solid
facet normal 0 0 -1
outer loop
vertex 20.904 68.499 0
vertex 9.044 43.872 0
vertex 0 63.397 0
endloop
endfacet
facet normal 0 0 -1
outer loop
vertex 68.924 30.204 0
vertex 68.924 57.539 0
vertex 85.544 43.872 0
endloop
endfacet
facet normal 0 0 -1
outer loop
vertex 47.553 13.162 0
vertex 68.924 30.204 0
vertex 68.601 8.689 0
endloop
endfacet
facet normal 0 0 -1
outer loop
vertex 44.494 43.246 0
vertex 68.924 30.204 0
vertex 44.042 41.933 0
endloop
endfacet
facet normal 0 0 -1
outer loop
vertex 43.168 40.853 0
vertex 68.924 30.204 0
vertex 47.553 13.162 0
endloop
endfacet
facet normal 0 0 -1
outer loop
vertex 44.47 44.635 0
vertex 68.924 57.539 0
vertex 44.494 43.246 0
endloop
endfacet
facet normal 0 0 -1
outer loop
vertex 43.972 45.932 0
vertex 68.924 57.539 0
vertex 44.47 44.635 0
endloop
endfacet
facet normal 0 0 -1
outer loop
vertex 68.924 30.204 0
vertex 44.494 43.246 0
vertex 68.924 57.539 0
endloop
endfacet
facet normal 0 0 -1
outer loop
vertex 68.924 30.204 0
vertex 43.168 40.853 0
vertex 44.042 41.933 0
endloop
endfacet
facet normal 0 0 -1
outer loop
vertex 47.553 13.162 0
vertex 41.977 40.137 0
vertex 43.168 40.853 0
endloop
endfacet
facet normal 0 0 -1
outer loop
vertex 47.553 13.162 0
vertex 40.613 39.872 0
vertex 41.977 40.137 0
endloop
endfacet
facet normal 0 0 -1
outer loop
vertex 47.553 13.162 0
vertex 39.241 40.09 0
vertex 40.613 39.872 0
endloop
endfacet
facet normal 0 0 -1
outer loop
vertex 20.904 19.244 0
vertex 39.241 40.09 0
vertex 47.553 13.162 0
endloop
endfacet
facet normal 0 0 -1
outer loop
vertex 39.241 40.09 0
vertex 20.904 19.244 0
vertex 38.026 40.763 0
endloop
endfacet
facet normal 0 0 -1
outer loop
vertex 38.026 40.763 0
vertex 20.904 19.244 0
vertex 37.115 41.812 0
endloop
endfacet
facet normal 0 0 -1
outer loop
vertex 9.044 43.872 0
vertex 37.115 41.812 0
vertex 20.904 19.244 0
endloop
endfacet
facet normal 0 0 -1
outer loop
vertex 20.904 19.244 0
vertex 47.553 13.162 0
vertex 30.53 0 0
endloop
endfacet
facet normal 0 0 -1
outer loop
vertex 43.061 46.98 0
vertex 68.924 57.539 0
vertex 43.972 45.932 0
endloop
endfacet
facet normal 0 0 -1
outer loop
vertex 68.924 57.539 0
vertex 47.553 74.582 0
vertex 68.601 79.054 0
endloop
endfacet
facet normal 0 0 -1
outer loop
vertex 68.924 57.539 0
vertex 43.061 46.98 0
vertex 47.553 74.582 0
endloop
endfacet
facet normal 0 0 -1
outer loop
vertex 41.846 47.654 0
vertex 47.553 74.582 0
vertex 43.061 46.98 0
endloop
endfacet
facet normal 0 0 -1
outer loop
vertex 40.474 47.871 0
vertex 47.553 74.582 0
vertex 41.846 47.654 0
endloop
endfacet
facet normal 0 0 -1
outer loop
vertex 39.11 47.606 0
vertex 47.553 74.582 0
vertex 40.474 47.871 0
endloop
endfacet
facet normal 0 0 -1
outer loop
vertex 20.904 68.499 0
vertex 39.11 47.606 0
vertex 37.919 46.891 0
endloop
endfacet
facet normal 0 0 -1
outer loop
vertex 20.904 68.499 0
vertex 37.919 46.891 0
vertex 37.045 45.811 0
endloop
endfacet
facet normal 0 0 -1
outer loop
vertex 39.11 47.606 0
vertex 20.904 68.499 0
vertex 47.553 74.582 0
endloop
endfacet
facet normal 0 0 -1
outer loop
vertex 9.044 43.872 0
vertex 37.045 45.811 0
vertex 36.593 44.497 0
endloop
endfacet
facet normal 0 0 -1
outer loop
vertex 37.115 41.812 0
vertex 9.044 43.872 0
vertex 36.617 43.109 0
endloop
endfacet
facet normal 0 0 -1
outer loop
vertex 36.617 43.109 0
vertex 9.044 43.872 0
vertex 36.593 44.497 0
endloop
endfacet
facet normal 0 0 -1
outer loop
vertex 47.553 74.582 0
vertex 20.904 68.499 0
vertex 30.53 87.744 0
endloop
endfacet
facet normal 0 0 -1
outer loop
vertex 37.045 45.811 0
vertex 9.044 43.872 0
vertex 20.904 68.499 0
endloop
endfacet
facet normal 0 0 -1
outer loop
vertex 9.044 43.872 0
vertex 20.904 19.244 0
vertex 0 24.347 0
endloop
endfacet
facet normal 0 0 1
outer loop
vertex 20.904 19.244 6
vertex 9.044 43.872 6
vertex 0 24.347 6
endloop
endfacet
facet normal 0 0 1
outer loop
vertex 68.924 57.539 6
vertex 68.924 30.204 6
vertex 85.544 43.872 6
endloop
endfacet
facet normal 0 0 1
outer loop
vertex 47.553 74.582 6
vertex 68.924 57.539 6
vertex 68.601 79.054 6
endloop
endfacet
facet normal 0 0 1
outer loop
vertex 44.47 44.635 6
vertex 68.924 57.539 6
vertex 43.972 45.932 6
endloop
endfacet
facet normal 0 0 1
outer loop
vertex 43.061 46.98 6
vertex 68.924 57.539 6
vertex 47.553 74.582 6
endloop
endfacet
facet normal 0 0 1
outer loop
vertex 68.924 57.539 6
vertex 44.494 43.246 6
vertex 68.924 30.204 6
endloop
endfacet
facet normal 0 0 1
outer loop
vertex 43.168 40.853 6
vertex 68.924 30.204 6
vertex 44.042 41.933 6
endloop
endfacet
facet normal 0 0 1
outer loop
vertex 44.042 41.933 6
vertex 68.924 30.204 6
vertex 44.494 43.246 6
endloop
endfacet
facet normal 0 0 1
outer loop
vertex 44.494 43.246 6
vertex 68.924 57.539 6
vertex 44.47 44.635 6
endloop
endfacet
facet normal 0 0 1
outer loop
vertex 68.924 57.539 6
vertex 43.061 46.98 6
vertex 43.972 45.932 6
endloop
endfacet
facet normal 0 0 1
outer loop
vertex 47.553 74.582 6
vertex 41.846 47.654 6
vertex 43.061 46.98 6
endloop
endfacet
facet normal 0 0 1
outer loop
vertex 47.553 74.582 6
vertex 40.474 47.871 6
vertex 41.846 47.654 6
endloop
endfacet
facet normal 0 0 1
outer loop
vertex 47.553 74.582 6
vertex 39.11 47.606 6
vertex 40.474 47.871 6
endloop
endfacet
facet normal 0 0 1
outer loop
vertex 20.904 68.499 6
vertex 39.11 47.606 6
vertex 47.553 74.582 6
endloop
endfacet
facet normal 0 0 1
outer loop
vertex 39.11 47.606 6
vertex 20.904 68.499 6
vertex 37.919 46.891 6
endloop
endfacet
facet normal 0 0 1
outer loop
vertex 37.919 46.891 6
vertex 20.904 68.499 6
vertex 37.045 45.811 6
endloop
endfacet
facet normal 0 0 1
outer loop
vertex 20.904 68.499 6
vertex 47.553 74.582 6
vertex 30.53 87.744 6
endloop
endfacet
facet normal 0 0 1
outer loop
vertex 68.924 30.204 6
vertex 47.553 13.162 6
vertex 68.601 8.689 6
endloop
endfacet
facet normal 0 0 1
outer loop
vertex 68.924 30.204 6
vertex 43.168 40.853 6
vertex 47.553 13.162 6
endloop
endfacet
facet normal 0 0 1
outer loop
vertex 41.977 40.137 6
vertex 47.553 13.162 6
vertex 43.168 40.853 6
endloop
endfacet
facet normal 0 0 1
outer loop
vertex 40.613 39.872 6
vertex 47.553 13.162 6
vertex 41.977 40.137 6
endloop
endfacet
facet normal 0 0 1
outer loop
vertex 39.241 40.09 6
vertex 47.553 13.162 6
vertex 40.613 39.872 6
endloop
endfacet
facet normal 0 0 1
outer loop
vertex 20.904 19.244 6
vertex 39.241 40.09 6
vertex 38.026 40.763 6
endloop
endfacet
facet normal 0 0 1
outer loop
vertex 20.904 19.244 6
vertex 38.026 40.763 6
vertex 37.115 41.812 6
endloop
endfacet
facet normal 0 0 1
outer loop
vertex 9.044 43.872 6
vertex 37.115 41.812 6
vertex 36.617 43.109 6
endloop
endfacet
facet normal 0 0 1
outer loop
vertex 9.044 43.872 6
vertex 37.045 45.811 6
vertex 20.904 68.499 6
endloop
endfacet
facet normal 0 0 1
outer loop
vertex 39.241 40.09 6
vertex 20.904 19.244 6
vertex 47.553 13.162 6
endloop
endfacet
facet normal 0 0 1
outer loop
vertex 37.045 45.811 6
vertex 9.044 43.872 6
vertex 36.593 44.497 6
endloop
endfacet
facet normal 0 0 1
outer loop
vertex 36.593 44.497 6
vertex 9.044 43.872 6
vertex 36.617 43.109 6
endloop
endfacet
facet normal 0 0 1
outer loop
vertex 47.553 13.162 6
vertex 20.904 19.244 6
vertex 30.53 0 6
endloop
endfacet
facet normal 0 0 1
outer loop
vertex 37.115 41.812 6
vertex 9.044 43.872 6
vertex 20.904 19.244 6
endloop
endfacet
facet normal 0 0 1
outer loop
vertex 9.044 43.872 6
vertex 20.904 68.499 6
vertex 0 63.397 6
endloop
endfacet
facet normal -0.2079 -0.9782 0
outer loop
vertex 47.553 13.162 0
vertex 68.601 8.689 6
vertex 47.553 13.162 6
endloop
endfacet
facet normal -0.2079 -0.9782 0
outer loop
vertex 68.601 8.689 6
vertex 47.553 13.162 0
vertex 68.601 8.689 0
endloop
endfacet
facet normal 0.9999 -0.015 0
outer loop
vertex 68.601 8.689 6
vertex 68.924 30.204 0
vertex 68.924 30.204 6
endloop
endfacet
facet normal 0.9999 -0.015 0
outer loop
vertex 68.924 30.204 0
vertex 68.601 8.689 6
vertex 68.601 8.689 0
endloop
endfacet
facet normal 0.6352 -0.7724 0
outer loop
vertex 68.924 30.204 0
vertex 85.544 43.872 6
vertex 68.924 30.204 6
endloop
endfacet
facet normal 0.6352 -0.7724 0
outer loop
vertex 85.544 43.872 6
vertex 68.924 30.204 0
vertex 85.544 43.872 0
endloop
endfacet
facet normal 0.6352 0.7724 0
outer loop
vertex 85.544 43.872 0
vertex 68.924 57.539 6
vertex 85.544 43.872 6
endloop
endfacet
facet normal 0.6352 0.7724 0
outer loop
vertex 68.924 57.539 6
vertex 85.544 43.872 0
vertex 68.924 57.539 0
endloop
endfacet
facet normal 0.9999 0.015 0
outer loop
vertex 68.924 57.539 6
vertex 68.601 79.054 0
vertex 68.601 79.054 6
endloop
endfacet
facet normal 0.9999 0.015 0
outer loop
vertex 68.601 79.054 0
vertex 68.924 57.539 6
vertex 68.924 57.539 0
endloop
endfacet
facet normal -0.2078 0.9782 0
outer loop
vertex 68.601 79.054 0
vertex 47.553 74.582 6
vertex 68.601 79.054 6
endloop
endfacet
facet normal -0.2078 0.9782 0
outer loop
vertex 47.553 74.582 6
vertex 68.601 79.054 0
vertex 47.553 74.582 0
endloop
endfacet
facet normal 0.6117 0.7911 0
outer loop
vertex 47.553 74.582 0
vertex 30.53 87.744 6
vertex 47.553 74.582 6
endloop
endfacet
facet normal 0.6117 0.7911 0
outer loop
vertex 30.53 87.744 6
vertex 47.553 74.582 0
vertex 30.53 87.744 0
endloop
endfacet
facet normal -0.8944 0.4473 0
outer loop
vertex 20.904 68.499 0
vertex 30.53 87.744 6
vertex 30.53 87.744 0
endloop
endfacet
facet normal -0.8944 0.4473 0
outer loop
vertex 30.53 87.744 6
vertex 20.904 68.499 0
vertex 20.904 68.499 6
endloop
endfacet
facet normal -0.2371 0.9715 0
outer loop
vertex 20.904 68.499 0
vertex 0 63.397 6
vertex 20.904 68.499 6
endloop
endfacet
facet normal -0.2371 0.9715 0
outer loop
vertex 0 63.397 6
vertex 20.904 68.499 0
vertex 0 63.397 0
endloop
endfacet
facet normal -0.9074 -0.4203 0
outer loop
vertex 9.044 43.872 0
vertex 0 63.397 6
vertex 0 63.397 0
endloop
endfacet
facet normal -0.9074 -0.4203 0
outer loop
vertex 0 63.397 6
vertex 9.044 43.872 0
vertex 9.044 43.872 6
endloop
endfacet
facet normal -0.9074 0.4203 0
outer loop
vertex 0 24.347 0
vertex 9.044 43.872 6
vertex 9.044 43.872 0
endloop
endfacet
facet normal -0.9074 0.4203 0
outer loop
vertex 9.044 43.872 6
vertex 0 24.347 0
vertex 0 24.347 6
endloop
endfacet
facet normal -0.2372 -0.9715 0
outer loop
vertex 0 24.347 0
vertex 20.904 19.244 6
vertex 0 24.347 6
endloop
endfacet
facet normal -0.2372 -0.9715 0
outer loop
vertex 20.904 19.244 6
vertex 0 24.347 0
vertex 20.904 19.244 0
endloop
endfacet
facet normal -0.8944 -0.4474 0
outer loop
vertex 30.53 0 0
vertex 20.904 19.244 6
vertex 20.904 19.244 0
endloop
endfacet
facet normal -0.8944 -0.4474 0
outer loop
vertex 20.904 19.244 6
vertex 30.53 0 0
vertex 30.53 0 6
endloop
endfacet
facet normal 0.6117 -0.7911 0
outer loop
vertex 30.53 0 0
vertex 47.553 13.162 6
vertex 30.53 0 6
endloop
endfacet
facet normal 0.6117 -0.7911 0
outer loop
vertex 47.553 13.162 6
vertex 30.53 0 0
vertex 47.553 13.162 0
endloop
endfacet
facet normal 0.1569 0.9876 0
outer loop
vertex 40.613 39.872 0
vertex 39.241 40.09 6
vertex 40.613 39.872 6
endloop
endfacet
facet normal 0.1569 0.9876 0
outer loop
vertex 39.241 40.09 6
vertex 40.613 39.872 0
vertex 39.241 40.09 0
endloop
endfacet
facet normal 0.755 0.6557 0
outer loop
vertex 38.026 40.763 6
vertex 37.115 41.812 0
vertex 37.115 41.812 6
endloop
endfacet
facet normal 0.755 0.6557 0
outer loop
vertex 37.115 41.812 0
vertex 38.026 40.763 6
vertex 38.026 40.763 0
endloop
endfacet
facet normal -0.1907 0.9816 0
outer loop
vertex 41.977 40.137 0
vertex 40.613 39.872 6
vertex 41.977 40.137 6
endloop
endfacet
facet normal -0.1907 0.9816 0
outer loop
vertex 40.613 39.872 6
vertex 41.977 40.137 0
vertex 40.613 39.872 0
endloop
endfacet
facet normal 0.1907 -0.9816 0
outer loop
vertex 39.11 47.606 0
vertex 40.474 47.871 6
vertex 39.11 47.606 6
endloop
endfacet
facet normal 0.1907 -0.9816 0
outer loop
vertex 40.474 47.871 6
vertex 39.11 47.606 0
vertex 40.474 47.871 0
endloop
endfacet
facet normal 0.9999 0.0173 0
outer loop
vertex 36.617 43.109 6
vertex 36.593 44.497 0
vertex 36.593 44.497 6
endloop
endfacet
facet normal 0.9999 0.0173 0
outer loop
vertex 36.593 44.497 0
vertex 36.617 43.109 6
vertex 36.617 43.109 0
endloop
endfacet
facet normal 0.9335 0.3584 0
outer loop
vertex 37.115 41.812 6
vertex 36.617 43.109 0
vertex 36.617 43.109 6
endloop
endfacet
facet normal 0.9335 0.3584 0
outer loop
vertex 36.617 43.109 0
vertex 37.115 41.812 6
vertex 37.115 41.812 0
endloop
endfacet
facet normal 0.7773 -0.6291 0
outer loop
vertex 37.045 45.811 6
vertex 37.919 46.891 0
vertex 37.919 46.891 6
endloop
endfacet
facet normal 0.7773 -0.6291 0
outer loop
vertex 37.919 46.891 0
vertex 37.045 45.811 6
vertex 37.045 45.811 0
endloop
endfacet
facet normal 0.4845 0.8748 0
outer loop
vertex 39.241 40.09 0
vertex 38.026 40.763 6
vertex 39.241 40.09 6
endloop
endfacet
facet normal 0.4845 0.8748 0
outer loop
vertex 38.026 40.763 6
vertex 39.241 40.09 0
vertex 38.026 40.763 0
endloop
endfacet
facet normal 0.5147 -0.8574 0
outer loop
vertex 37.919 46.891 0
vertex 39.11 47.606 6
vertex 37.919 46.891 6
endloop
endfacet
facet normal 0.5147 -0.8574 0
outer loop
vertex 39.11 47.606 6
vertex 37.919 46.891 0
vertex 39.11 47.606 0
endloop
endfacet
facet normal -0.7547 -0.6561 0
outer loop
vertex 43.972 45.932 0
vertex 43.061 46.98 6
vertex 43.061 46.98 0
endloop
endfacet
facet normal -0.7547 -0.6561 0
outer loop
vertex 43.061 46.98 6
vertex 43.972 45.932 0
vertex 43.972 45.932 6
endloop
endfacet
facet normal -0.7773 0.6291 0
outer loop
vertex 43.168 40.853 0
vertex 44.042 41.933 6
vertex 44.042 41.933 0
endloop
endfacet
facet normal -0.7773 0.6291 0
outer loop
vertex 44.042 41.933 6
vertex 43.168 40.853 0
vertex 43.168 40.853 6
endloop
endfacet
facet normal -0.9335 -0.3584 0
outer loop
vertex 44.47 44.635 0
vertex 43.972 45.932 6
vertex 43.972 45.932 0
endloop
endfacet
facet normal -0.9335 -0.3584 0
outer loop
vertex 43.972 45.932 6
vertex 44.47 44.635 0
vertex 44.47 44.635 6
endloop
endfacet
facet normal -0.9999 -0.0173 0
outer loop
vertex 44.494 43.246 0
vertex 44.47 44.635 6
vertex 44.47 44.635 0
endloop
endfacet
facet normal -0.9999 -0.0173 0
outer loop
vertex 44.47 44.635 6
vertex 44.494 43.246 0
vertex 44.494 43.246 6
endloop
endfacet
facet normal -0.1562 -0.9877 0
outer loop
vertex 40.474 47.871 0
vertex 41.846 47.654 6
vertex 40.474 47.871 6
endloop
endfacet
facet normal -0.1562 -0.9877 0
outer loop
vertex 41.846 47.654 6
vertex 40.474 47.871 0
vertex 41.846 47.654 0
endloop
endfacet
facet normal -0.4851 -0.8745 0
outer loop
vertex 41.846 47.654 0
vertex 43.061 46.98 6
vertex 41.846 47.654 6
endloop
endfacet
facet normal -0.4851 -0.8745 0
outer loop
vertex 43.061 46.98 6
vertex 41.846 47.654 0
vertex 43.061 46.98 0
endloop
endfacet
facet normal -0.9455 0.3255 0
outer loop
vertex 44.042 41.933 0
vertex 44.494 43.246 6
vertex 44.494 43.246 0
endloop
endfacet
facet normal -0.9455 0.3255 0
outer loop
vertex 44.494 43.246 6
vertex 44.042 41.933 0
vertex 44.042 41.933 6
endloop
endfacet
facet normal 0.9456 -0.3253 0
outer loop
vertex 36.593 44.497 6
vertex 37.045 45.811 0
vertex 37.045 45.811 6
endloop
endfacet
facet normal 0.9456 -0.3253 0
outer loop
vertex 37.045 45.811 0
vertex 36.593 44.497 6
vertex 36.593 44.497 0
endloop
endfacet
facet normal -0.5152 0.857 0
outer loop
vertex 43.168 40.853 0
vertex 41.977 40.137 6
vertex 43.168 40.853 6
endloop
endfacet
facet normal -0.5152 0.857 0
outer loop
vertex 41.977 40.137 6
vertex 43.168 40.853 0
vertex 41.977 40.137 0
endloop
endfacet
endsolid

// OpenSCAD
$fn = 32;

// ----------------------------------------------------------------------
// Star wheel: 7-point blunt, R45
// ----------------------------------------------------------------------

// --- parameters (mm) ---
n_points = 7;             // number of points / teeth
r_out = 45;               // tip radius
r_in = 31.5;              // root radius
bore_r = 4;               // centre bore radius
plate_t = 6;              // plate thickness, Z (extrusion height)
bore_d = 8;               // centre bore diameter

profile = [[85.544, 43.872], [68.924, 57.539], [68.601, 79.054], [47.553, 74.582], [30.53, 87.744], [20.904, 68.499], [0, 63.397], [9.044, 43.872], [0, 24.347], [20.904, 19.244], [30.53, 0], [47.553, 13.162], [68.601, 8.689], [68.924, 30.204]];  // primary outline, 14 points, counter clockwise
void_1 = [[44.47, 44.635], [43.972, 45.932], [43.061, 46.98], [41.846, 47.654], [40.474, 47.871], [39.11, 47.606], [37.919, 46.891], [37.045, 45.811], [36.593, 44.497], [36.617, 43.109], [37.115, 41.812], [38.026, 40.763], [39.241, 40.09], [40.613, 39.872], [41.977, 40.137], [43.168, 40.853], [44.042, 41.933], [44.494, 43.246]];  // centre bore, 18 points

// --- the one profile operation ---
difference() {
  linear_extrude(height = plate_t) polygon(points = profile);
  translate([0, 0, -1])
    linear_extrude(height = plate_t + 2) polygon(points = void_1);
}
